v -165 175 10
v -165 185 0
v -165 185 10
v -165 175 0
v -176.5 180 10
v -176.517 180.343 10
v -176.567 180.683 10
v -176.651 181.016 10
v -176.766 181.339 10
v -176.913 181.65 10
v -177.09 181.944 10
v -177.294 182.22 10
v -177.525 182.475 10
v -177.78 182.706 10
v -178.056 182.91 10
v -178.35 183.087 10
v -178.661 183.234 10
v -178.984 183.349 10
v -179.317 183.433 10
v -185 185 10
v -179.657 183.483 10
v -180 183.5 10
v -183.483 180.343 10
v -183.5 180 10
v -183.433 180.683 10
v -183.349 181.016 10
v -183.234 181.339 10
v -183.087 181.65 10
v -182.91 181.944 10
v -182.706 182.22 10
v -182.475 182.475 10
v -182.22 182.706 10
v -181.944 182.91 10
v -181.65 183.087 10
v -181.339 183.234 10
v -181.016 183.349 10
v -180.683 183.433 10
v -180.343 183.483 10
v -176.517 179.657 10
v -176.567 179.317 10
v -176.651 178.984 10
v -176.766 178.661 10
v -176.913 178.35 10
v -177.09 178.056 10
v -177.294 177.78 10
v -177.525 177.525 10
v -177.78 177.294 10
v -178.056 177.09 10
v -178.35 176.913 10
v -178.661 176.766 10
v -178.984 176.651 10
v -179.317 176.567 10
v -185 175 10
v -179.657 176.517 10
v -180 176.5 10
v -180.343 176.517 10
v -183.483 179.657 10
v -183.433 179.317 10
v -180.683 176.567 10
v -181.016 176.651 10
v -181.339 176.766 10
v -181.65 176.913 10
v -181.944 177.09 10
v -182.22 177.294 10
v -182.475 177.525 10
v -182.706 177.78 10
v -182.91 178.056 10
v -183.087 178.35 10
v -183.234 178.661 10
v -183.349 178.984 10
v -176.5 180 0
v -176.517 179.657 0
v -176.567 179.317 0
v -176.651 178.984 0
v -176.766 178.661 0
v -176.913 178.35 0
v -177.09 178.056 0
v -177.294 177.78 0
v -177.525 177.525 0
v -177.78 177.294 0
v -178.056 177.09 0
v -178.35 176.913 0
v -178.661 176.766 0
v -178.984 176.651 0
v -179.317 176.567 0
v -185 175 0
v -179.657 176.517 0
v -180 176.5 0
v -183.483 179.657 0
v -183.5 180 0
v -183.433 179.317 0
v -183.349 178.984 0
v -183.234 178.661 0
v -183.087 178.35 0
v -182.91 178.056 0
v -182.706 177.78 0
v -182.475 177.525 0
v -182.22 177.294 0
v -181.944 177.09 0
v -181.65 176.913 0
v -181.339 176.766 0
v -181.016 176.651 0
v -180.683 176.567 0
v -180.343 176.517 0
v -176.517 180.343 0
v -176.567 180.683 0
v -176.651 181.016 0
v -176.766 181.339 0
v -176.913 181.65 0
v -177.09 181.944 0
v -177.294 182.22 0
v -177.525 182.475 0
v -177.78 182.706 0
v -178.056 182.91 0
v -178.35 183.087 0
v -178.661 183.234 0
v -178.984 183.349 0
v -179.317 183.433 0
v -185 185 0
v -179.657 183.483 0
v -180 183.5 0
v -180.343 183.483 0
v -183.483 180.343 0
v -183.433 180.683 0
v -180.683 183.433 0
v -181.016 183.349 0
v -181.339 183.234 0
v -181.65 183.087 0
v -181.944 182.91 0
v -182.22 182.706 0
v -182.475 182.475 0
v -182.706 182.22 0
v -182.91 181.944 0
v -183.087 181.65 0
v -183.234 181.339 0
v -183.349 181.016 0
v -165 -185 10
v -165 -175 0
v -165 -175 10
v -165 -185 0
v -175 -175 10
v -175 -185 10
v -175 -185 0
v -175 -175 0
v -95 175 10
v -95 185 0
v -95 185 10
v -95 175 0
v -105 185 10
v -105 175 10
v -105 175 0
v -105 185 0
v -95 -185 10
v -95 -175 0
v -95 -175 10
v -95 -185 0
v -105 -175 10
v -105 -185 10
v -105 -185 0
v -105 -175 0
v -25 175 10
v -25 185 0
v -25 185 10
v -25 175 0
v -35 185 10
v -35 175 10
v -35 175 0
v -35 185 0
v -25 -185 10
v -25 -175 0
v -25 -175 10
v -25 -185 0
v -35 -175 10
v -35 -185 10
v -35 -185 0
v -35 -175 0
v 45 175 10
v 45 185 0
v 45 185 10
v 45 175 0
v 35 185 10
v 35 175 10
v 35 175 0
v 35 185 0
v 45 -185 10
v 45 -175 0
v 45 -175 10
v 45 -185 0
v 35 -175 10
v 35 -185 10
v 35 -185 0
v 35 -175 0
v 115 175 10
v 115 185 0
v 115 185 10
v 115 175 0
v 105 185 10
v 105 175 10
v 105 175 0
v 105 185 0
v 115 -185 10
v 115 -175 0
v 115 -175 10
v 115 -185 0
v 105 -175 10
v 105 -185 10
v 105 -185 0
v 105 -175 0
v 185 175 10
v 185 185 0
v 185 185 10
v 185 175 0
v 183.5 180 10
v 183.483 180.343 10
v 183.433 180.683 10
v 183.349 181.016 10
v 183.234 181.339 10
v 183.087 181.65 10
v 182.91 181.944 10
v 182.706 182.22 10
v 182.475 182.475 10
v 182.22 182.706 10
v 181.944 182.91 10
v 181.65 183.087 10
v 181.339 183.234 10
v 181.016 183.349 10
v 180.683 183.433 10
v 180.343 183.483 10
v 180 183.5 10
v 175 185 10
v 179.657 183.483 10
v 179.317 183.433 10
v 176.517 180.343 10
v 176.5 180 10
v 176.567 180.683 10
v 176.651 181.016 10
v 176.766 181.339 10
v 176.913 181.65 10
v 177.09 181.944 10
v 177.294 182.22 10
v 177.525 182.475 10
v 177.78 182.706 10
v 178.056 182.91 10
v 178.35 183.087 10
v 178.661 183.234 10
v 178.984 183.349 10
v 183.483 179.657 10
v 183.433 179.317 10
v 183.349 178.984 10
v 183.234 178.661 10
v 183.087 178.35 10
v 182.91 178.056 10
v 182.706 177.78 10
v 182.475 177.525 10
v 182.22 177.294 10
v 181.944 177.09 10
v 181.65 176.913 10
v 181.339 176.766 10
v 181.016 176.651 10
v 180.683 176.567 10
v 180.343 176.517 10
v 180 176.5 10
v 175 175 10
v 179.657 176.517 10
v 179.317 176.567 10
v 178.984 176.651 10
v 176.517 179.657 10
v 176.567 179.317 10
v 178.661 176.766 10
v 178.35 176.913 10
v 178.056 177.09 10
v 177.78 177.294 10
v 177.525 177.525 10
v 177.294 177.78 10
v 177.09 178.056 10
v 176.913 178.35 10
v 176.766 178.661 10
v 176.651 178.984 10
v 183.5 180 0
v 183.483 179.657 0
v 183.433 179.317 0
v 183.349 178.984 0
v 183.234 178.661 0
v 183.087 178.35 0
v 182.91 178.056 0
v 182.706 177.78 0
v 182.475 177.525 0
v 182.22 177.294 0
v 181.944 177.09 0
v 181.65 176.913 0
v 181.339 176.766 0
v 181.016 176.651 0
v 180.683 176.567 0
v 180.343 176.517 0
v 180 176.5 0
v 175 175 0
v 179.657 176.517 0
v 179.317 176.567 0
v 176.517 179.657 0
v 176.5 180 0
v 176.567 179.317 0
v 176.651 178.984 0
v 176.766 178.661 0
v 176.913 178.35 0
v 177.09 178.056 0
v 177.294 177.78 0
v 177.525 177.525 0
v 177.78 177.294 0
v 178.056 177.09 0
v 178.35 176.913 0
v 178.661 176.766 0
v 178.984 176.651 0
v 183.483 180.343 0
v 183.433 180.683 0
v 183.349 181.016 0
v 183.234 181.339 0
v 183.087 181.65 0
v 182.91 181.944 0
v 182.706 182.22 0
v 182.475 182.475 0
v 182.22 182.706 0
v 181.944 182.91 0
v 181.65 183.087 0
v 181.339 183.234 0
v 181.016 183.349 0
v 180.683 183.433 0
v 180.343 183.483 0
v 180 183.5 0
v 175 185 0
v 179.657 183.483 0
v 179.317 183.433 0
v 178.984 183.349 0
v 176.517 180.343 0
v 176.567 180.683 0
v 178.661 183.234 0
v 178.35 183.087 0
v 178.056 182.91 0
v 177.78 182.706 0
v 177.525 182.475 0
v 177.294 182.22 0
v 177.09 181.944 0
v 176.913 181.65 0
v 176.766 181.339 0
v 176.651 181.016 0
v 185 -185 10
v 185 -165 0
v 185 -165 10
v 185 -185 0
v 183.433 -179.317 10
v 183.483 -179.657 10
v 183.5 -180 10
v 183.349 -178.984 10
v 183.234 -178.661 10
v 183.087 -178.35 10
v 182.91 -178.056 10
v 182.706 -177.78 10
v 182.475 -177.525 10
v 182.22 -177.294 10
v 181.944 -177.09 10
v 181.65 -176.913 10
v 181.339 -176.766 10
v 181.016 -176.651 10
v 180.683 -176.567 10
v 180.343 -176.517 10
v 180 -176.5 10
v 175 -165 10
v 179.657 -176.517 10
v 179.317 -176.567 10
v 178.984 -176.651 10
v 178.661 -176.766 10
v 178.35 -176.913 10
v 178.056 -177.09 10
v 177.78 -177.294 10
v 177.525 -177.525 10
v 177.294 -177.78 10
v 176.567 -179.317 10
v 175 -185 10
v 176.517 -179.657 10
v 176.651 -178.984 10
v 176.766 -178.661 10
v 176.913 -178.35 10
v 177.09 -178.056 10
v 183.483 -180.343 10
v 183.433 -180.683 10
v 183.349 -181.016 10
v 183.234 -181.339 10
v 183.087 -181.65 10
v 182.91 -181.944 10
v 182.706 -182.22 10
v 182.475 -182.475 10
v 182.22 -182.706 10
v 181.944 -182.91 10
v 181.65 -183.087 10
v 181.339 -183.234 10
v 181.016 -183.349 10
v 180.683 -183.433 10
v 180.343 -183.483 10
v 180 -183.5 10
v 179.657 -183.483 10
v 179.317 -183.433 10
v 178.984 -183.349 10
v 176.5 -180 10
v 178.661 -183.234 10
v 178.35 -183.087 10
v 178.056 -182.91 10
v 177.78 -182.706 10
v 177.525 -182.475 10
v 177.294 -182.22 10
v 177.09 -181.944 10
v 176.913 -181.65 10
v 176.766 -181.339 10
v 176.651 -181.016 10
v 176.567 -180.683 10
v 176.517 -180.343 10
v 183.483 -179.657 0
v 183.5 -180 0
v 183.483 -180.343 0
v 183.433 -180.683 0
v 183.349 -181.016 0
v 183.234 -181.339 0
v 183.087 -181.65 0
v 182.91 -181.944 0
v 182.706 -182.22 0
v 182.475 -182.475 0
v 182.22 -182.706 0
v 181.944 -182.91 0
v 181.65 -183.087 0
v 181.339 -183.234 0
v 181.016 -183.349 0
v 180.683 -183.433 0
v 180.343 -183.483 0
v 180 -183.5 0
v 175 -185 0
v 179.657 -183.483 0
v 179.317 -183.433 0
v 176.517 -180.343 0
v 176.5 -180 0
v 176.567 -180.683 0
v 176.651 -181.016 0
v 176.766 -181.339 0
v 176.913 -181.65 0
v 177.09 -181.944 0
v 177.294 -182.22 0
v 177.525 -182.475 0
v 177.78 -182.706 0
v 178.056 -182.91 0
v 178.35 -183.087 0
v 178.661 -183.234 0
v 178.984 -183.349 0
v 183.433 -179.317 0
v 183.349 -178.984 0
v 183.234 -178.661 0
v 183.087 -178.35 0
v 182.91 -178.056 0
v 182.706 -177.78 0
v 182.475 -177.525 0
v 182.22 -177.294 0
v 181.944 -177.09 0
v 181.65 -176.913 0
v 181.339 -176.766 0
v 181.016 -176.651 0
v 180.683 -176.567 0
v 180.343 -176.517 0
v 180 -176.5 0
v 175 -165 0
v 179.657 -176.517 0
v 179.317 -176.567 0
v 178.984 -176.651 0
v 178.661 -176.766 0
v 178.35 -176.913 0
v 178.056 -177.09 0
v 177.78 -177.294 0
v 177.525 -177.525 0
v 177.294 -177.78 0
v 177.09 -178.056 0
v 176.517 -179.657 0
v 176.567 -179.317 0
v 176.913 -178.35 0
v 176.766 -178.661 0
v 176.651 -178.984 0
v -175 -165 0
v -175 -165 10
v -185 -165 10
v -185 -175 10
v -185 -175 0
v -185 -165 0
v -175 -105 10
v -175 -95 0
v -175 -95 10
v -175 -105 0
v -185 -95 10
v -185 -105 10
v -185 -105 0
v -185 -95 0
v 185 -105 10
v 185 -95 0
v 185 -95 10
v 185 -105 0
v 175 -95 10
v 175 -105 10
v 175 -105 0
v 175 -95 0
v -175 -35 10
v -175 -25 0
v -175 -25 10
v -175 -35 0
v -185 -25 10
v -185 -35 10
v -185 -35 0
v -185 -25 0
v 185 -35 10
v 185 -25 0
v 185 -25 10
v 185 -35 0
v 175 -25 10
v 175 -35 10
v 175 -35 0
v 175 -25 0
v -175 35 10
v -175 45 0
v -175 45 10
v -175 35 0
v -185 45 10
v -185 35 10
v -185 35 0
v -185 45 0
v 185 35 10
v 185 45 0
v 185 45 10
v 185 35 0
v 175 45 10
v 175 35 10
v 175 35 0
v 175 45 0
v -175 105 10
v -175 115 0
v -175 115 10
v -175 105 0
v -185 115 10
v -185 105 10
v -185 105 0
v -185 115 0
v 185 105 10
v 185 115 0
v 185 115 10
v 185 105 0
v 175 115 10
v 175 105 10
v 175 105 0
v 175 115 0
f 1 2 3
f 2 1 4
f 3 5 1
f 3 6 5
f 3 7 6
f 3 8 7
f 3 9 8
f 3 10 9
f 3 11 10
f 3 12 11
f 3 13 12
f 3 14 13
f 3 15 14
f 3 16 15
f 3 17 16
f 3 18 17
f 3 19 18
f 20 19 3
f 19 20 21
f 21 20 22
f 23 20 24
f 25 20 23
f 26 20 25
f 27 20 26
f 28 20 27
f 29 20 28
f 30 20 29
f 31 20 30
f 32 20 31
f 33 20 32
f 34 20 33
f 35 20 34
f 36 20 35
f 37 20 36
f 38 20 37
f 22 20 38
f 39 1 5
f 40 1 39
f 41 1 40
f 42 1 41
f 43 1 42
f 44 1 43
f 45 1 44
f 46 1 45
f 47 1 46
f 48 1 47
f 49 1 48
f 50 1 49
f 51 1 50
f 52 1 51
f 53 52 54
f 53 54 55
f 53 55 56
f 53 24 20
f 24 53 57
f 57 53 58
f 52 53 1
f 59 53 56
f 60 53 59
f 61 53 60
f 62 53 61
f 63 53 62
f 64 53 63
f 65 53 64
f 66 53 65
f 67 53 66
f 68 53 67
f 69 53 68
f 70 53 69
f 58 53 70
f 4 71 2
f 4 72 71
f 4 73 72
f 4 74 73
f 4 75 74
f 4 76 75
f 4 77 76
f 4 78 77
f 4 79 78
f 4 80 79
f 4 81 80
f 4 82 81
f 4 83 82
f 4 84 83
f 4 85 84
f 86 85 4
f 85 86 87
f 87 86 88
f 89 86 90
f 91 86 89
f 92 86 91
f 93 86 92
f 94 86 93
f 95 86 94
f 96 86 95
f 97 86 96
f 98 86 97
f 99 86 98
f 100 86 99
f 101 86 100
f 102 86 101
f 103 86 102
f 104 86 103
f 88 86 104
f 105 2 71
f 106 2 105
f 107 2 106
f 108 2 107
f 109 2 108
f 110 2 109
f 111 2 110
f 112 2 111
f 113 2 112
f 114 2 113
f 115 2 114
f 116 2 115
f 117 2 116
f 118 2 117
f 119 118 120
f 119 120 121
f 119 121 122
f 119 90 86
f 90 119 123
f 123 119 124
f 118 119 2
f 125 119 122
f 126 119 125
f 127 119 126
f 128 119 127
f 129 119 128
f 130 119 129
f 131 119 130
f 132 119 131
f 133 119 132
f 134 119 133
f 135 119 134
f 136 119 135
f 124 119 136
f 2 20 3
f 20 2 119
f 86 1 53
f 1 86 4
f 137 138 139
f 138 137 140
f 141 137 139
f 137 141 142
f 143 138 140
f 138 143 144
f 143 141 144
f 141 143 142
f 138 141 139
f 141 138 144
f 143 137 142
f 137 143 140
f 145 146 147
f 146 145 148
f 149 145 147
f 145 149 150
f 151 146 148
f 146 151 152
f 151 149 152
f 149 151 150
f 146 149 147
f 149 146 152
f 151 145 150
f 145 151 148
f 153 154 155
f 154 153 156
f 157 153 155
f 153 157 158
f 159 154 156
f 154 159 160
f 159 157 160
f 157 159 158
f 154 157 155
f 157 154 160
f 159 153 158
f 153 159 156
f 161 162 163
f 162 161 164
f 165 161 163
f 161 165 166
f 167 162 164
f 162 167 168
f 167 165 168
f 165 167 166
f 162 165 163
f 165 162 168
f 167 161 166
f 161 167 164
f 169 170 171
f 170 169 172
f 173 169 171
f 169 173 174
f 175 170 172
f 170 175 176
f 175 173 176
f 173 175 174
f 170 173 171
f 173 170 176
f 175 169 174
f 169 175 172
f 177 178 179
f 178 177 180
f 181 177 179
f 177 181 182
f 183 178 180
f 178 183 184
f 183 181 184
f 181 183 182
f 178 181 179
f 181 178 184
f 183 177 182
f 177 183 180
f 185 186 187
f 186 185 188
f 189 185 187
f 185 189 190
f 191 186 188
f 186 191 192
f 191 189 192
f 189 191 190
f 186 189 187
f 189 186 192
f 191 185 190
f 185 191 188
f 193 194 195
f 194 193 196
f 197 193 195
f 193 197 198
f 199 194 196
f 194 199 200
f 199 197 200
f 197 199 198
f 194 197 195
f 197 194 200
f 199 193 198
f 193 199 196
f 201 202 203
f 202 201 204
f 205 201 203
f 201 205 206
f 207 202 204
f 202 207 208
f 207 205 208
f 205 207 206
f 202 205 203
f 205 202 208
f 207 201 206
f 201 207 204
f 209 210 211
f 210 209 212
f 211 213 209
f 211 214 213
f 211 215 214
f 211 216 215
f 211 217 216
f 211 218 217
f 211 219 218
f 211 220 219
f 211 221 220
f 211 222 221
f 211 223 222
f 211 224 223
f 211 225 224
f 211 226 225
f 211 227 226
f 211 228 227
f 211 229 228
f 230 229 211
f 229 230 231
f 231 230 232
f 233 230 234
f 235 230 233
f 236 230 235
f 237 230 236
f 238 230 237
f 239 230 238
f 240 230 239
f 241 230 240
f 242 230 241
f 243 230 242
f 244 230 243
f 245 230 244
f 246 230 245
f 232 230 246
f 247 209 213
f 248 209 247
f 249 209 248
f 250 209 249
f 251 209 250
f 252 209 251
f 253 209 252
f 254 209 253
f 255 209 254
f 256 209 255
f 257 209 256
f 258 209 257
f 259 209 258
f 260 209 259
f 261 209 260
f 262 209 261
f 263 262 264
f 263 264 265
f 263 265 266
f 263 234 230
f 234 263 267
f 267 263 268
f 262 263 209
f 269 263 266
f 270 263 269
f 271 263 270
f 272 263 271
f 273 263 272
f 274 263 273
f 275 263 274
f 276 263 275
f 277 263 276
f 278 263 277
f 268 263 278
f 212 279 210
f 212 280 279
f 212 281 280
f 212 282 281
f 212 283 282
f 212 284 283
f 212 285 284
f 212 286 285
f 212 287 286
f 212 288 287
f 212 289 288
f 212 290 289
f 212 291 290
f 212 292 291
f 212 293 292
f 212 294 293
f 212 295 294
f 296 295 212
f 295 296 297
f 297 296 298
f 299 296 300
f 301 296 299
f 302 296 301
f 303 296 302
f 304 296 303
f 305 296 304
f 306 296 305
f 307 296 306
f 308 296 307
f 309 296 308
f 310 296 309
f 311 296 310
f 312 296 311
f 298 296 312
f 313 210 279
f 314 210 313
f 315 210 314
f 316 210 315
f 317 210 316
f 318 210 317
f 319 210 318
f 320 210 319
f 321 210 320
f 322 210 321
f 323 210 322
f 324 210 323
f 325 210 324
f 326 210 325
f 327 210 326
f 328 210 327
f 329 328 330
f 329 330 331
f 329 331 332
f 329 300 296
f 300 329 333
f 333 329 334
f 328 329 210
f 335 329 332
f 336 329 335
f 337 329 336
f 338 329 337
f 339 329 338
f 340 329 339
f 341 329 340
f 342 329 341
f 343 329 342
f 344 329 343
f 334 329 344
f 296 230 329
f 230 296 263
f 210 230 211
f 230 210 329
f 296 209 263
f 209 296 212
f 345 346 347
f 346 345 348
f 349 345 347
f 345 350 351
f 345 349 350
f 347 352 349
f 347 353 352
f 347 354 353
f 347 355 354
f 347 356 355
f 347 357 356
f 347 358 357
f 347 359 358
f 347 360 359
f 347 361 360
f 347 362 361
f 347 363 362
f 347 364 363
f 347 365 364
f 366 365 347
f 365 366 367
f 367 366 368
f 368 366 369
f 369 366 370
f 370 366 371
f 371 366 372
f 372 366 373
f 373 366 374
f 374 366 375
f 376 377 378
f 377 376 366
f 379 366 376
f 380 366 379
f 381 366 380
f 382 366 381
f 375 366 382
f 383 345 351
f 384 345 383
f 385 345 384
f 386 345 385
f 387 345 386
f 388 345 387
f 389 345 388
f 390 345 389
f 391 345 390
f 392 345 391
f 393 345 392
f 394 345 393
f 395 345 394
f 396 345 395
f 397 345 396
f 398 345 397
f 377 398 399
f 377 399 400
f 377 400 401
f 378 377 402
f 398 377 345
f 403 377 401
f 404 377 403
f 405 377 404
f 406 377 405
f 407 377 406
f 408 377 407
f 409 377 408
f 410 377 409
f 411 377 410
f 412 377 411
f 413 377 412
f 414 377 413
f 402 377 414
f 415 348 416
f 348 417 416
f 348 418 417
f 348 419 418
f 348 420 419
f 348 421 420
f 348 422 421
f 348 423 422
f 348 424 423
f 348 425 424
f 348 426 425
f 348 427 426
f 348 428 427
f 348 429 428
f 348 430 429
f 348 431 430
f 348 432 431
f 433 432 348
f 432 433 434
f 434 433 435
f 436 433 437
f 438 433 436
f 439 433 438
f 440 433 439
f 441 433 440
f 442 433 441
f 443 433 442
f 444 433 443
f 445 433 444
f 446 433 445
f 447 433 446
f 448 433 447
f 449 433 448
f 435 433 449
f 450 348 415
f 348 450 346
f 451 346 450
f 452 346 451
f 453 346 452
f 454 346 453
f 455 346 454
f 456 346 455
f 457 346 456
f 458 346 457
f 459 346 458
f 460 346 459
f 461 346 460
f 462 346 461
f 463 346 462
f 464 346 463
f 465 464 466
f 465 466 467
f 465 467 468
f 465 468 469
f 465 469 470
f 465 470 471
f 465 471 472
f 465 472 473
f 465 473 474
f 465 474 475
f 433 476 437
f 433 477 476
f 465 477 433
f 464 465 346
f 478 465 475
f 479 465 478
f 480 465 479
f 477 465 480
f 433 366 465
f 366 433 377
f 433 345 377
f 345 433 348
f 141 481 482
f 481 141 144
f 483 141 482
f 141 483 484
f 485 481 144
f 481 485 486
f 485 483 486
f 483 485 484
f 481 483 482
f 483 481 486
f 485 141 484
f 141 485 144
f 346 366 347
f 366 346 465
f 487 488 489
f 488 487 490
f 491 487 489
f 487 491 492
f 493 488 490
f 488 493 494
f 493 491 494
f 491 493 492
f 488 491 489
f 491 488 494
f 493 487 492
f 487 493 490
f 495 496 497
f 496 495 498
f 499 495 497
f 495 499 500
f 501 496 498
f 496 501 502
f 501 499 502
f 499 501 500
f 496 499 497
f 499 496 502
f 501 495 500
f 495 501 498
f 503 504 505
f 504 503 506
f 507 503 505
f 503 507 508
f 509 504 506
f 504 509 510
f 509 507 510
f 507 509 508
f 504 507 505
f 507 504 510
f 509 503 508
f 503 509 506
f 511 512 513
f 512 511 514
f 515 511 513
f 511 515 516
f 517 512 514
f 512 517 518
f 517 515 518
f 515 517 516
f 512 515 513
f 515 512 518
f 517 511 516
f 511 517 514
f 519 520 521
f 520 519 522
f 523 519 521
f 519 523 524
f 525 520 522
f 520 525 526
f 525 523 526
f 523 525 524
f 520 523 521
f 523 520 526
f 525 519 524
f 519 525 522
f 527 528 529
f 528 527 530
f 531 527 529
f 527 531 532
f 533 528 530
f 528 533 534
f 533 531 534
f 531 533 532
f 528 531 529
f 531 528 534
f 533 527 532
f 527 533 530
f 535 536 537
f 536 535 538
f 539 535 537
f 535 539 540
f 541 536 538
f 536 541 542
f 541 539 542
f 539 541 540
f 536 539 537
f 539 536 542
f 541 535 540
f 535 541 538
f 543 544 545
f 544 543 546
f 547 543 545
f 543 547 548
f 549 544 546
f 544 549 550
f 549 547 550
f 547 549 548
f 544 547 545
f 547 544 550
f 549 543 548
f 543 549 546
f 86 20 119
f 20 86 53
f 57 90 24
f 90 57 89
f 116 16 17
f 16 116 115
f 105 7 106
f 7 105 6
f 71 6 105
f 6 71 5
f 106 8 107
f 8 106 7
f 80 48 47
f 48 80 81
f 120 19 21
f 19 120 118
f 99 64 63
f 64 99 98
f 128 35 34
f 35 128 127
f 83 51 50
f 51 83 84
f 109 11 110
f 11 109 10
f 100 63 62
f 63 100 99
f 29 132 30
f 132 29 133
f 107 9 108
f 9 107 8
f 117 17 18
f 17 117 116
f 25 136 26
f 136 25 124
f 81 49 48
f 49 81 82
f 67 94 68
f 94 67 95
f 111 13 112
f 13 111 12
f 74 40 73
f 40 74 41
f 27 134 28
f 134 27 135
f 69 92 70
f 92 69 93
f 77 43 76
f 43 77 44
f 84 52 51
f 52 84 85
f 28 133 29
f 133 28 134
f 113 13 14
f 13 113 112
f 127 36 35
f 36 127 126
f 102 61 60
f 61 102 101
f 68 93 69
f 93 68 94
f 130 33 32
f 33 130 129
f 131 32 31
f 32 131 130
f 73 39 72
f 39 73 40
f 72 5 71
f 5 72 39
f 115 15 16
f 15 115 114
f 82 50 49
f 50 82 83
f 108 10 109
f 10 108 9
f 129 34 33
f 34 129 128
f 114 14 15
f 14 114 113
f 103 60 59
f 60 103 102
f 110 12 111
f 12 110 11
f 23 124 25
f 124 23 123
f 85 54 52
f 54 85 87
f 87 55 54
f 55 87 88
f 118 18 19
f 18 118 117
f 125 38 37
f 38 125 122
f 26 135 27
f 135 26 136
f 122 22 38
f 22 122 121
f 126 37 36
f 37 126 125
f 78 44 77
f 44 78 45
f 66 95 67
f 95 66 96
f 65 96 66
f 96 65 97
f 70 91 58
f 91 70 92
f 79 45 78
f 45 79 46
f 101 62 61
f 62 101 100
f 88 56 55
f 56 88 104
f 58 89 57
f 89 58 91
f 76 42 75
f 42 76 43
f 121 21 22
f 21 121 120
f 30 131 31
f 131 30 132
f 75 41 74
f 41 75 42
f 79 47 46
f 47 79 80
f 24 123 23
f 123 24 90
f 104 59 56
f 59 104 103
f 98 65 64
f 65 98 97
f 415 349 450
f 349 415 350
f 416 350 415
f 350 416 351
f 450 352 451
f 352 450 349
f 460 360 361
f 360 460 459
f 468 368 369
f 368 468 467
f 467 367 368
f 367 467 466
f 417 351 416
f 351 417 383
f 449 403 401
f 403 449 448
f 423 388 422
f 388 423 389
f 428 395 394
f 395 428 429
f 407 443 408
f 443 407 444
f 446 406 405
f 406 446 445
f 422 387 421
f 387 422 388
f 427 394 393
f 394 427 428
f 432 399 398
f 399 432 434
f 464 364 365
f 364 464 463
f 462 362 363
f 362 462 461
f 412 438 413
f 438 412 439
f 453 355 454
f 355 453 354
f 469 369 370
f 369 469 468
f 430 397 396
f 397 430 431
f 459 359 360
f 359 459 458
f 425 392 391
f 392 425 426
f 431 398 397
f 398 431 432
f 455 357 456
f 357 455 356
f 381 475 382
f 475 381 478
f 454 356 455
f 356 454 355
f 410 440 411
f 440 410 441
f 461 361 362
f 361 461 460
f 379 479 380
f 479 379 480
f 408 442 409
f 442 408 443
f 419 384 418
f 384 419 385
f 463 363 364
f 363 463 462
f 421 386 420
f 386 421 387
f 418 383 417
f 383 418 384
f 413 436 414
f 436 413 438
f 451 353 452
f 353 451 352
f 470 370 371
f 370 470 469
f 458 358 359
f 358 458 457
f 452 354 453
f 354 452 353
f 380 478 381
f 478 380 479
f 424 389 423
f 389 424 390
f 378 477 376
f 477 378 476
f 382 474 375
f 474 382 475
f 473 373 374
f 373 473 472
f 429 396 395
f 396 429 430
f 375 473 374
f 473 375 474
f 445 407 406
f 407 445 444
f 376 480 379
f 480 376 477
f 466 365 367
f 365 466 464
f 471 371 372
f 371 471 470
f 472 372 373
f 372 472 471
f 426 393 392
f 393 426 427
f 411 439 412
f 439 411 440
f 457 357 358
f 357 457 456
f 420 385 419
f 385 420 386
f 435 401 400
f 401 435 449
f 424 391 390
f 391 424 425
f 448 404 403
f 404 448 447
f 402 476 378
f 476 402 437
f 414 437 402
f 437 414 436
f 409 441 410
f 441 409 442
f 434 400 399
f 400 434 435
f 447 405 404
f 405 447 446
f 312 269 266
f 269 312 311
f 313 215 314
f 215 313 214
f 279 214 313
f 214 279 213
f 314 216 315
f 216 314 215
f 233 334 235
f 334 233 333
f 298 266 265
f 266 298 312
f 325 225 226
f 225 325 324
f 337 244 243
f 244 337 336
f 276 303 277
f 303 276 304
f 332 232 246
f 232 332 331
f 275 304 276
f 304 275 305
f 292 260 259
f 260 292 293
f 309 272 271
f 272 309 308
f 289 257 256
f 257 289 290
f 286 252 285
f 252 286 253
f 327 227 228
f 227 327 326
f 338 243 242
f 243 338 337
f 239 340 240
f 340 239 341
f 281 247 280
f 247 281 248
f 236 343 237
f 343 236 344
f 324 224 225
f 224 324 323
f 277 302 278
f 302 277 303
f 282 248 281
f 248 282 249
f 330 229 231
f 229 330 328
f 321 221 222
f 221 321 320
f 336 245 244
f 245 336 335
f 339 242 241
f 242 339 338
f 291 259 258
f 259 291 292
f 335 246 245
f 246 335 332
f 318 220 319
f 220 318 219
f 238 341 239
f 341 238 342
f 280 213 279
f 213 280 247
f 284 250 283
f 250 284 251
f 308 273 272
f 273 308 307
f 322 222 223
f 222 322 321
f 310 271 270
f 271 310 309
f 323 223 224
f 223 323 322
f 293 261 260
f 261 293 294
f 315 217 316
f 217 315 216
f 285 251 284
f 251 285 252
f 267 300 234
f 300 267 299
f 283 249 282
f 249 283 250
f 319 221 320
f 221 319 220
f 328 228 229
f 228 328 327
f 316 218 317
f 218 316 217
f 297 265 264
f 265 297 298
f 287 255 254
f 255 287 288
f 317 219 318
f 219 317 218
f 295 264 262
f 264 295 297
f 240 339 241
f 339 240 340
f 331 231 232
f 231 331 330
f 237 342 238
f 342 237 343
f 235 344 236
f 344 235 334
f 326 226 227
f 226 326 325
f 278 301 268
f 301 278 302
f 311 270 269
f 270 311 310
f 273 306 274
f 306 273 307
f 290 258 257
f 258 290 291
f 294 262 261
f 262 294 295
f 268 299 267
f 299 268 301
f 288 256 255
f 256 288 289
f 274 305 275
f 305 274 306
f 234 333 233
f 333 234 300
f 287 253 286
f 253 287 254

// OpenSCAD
// ring_02.scad - ring index 2 (z bottom = 20 mm)
$fn = 64; bar = 10; half_b = bar/2; outer = 370; half_outer = outer/2;
front_y = 180; back_y = -180; left_x = -180; right_x = 180;
x_centers = [-170, -100, -30, 40, 110, 180];
z_centers = [5, 85, 155, 225, 295, 365, 435, 505, 575, 645, 715]; ring_z = 20;
module place_box(cx, cy, sx, sy) { translate([cx - sx/2, cy - sy/2, 0]) cube([sx, sy, bar]); }

difference() { union() {
    for (x = x_centers) { place_box(x, front_y, bar, bar); place_box(x, back_y, bar, bar); }
    for (y = x_centers) { place_box(left_x, y, bar, bar); place_box(right_x, y, bar, bar); }
    for (zc = z_centers) if ((zc - half_b < ring_z + bar) && (zc + half_b > ring_z)) {
        translate([-half_outer, front_y - half_b, 0]) cube([outer, bar, bar]);
        translate([-half_outer, back_y - half_b, 0])  cube([outer, bar, bar]);
        translate([left_x - half_b, -half_outer, 0])  cube([bar, outer, bar]);
        translate([right_x - half_b, -half_outer, 0]) cube([bar, outer, bar]);
    }
  }
  for (cx = [-180, 180]) for (cy = [-180, 180]) translate([cx, cy, 0]) cylinder(h = bar, r = 3.5, $fn = 64);
}
